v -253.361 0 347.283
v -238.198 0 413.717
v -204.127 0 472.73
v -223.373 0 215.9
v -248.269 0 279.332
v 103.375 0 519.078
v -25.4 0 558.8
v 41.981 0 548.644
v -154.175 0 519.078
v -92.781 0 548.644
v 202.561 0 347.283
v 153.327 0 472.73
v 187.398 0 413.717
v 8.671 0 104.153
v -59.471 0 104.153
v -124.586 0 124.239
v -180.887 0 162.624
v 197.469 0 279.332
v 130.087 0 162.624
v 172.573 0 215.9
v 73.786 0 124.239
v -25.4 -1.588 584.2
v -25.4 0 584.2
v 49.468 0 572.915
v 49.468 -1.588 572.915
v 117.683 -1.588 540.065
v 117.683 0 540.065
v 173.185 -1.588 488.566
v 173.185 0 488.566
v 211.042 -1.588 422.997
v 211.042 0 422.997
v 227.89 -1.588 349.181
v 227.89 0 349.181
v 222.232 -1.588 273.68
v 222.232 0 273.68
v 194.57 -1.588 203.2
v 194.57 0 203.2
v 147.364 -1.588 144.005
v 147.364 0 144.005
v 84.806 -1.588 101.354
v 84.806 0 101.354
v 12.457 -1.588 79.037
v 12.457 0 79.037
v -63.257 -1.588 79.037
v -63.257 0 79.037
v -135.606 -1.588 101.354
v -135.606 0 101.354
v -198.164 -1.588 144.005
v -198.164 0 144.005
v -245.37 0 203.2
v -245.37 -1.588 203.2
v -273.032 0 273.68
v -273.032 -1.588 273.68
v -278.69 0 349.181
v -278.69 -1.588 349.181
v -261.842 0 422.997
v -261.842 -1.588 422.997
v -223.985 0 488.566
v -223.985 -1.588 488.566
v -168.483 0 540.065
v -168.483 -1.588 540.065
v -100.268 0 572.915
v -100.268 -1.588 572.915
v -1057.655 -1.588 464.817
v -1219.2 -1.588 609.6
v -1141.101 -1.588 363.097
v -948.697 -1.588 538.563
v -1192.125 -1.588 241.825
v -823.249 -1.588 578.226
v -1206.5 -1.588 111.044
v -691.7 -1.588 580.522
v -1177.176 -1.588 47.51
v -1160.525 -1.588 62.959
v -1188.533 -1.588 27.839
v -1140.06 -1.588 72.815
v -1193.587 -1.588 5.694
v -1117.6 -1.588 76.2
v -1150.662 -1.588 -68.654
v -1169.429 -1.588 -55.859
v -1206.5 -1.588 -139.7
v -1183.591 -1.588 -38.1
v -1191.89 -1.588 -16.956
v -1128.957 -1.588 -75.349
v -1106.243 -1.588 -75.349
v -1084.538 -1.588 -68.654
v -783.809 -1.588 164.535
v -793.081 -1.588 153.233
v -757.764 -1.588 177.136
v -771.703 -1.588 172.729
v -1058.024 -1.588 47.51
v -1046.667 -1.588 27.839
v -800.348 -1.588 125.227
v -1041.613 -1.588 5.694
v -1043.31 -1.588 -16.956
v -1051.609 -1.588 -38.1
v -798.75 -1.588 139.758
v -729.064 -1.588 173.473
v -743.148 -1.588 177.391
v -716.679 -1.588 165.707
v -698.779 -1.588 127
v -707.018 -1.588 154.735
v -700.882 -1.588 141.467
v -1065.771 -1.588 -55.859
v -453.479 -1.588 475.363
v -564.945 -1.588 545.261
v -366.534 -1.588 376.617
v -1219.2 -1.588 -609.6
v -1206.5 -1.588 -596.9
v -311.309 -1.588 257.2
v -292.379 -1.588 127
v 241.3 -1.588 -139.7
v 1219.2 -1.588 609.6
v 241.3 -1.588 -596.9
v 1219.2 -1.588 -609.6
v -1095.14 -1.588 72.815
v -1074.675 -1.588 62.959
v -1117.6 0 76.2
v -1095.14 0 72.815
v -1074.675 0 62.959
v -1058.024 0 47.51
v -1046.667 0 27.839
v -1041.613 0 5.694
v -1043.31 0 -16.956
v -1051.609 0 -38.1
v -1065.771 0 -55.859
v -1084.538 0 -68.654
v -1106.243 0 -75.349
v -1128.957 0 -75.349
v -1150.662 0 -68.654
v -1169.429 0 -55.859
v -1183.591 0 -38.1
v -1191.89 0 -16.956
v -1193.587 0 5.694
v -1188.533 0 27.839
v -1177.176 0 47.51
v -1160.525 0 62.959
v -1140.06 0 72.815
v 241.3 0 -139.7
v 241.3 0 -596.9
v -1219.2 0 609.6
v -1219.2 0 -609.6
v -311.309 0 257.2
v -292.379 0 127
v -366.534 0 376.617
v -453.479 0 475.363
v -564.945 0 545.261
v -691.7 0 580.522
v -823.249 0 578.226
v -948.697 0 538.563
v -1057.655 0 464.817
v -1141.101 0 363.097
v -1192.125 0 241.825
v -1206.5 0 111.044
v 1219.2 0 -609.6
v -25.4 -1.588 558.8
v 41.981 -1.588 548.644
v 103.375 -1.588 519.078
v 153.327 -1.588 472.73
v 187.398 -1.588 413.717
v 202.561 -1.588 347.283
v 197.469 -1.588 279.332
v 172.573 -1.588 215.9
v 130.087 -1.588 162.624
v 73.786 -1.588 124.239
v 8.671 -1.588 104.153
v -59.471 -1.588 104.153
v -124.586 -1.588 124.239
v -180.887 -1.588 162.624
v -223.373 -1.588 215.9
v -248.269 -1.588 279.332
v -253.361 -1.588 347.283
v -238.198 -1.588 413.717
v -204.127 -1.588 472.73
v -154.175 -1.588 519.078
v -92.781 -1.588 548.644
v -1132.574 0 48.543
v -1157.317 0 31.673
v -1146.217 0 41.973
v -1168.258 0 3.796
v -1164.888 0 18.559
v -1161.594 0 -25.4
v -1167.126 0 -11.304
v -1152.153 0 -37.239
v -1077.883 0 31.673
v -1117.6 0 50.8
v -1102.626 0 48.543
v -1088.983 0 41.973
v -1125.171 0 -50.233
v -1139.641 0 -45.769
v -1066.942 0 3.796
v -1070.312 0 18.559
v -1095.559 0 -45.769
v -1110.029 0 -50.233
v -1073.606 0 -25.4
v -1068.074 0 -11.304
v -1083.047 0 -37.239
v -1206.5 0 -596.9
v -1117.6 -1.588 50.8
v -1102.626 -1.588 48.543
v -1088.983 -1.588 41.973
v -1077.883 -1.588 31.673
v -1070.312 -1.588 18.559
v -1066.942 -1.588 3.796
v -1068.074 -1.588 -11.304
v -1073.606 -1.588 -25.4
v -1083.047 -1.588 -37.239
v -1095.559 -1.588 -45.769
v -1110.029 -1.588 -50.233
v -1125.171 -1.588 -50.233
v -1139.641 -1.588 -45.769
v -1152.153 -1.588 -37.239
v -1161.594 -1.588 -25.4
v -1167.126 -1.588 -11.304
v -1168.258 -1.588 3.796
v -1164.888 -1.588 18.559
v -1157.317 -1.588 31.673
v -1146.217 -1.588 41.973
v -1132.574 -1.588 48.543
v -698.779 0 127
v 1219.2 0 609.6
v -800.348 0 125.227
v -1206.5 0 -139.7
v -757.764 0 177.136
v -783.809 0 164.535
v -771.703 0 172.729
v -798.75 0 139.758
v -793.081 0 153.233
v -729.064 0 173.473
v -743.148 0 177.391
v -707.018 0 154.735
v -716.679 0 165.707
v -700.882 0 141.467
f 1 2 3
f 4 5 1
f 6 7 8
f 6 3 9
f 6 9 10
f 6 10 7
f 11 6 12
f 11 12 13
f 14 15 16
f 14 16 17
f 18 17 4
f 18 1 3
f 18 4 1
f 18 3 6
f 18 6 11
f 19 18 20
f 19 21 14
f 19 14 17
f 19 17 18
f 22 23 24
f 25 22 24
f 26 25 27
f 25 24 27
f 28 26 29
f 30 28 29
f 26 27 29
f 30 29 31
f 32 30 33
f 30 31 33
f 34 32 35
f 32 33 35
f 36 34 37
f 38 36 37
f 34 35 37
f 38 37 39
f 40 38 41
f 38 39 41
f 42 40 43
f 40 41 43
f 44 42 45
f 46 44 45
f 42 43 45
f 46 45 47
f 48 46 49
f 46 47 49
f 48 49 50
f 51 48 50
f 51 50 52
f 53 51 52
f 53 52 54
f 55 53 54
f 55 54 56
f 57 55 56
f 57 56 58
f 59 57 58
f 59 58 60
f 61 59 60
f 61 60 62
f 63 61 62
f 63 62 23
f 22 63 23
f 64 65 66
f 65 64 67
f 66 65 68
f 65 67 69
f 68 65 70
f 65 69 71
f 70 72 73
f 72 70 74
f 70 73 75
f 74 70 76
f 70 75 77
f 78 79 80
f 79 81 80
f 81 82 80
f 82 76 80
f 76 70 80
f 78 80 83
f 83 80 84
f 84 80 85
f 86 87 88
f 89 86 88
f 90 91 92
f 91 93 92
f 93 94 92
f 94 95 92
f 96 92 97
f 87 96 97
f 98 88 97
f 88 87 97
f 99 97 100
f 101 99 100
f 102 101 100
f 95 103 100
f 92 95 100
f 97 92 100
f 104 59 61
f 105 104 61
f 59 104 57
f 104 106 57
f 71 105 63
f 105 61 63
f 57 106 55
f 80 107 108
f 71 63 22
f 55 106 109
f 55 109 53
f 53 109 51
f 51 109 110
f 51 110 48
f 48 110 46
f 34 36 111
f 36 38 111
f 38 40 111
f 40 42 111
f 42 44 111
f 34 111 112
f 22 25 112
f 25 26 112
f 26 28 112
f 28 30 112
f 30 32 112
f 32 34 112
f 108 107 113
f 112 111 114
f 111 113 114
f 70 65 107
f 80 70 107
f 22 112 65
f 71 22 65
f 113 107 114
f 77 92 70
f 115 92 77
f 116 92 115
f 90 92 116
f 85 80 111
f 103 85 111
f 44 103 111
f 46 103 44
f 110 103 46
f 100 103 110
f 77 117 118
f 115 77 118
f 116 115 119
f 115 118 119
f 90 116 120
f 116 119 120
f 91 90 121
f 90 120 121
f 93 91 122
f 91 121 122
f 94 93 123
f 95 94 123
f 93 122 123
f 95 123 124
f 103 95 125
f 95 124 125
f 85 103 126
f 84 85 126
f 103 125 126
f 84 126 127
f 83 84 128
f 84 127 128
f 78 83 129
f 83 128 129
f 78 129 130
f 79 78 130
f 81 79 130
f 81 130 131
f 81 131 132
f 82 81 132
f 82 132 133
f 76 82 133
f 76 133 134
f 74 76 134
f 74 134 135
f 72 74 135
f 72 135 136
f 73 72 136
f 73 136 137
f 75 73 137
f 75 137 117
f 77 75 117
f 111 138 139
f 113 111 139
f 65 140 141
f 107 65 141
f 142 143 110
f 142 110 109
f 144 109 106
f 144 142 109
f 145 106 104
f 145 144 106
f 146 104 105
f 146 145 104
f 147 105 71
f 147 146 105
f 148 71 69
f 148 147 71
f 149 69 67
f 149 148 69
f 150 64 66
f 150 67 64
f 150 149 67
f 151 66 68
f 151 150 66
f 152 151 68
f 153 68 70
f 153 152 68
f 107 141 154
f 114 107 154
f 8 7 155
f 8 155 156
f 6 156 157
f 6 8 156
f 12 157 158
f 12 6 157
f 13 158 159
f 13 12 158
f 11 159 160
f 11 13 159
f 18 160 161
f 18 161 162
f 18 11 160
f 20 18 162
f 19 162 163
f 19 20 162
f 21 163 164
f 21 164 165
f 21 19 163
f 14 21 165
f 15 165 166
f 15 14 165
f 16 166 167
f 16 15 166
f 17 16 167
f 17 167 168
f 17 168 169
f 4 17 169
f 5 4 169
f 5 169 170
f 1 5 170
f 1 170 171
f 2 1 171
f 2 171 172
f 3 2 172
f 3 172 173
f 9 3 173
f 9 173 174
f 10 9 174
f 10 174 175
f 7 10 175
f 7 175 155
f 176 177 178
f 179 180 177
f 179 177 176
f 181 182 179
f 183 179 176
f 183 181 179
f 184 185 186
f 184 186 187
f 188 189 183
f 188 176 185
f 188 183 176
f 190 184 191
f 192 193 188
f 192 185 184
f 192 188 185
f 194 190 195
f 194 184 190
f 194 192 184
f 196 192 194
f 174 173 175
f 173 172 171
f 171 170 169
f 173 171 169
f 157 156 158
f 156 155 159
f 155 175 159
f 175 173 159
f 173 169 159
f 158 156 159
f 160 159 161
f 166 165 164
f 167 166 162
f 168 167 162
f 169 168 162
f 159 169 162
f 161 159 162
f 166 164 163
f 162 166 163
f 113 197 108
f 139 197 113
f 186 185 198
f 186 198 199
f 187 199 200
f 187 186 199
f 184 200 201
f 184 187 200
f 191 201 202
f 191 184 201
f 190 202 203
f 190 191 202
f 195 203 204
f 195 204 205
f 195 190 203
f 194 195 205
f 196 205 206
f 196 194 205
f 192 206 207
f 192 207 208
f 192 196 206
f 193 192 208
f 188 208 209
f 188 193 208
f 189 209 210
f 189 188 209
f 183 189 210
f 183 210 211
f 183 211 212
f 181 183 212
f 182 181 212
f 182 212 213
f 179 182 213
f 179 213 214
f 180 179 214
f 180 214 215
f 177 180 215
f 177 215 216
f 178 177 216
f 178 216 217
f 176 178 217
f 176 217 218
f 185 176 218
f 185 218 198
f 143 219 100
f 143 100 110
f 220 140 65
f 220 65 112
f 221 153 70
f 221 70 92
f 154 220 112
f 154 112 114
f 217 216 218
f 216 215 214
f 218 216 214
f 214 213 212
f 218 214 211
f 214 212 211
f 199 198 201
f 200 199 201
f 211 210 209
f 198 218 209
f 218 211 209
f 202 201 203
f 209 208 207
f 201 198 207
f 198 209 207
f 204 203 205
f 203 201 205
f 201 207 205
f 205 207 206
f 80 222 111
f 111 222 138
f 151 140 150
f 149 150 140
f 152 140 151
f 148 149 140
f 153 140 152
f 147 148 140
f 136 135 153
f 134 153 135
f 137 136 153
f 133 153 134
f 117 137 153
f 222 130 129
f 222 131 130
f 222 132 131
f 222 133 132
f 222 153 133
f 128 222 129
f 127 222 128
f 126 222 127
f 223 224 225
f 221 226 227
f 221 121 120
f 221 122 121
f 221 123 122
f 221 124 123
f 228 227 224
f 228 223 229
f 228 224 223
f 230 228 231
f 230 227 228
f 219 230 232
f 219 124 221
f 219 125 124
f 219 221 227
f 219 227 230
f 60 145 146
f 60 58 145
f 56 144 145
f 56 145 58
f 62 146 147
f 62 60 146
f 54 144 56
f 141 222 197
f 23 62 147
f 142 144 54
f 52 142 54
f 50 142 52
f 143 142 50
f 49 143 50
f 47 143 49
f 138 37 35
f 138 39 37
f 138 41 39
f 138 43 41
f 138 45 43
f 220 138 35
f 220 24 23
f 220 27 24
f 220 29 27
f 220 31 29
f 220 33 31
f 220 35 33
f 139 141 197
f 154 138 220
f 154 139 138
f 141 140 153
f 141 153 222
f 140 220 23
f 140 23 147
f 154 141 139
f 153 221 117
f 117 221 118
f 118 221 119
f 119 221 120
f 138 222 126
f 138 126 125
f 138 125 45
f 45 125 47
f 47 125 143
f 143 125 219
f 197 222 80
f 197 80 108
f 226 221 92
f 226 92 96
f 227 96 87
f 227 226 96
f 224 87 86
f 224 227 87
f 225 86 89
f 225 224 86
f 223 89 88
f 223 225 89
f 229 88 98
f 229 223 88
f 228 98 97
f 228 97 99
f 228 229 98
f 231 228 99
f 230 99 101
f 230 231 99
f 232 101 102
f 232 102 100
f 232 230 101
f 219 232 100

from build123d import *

# Parameters (mm, degrees)
SKETCH1_W          = 2438.4
SKETCH1_H          = 1219.2
BASE_FLANGE1_DEPTH = 1.5875
SKETCH6_R          = 254
SKETCH6_R_2        = 228.6
SKETCH6_R_3        = 76.2
SKETCH6_R_4        = 50.8
SKETCH6_W          = 1447.8
SKETCH6_H          = 457.2
CUT_EXTRUDE3_DEPTH = 1364.1079635


# Sheet-metal steps are written as plain solids
with BuildPart() as part:
    # Sketch1 → Base-Flange1 (new body)
    with BuildSketch(Plane(origin=(0, 0, 0), x_dir=(1, 0, 0), z_dir=(0, 1, 0))):
        Rectangle(SKETCH1_W, SKETCH1_H)
    extrude(amount=-BASE_FLANGE1_DEPTH)

    # Sketch6 → Cut-Extrude3 (cut, through all)
    # profile 1 of 4: a face of its own
    with BuildSketch(Plane(origin=(0, 0, 0), x_dir=(1, 0, 0), z_dir=(0, 1, 0))):
        with Locations(Location((-25.4, -330.2, 0), (0, 0, 270))):
            Circle(SKETCH6_R)
        with Locations(Location((-25.4, -330.2, 0), (0, 0, 270))):
            Circle(SKETCH6_R_2, mode=Mode.SUBTRACT)
    # profile 2 of 4: a face of its own
    with BuildSketch(Plane(origin=(0, 0, 0), x_dir=(1, 0, 0), z_dir=(0, 1, 0))):
        with Locations(Location((-1117.6, 0, 0), (0, 0, 270))):
            Circle(SKETCH6_R_3)
        with Locations(Location((-1117.6, 0, 0), (0, 0, 270))):
            Circle(SKETCH6_R_4, mode=Mode.SUBTRACT)
    # profile 3 of 4: a face of its own
    with BuildSketch(Plane(origin=(0, 0, 0), x_dir=(1, 0, 0), z_dir=(0, 1, 0))):
        with Locations((-482.6, 368.3)):
            Rectangle(SKETCH6_W, SKETCH6_H)
    # profile 4 of 4: a face of its own
    with BuildSketch(Plane(origin=(0, 0, 0), x_dir=(1, 0, 0), z_dir=(0, 1, 0))):
        with BuildLine():
            Line((-698.778513887, -127), (-292.378513887, -127))
            ThreePointArc((-292.378513887, -127), (-757.55775411, -584.130366226), (-1206.5, -111.043950108))
            Line((-1206.5, -111.043950108), (-800.347567899, -125.227105568))
            ThreePointArc((-800.347567899, -125.227105568), (-750.465096134, -177.792262914), (-698.778513887, -127))
        make_face()
    extrude(amount=-CUT_EXTRUDE3_DEPTH, mode=Mode.SUBTRACT)


with BuildPart() as cut_extrude3_piece_1:
    # of the separate pieces the step leaves, piece 1, a body of its own (cut_extrude3_pieces)
    add(part.part.solids().sort_by_distance((-1219.2, 0, 609.6))[0])


with BuildPart() as cut_extrude3_piece_2:
    # of the separate pieces the step leaves, piece 2, a body of its own (cut_extrude3_pieces)
    add(part.part.solids().sort_by_distance((-25.4, 0, 558.8))[0])


with BuildPart() as cut_extrude3_piece_3:
    # of the separate pieces the step leaves, piece 3, a body of its own (cut_extrude3_pieces)
    add(part.part.solids().sort_by_distance((-1117.6, 0, 50.8))[0])


solid = Compound([cut_extrude3_piece_1.part, cut_extrude3_piece_2.part, cut_extrude3_piece_3.part])
